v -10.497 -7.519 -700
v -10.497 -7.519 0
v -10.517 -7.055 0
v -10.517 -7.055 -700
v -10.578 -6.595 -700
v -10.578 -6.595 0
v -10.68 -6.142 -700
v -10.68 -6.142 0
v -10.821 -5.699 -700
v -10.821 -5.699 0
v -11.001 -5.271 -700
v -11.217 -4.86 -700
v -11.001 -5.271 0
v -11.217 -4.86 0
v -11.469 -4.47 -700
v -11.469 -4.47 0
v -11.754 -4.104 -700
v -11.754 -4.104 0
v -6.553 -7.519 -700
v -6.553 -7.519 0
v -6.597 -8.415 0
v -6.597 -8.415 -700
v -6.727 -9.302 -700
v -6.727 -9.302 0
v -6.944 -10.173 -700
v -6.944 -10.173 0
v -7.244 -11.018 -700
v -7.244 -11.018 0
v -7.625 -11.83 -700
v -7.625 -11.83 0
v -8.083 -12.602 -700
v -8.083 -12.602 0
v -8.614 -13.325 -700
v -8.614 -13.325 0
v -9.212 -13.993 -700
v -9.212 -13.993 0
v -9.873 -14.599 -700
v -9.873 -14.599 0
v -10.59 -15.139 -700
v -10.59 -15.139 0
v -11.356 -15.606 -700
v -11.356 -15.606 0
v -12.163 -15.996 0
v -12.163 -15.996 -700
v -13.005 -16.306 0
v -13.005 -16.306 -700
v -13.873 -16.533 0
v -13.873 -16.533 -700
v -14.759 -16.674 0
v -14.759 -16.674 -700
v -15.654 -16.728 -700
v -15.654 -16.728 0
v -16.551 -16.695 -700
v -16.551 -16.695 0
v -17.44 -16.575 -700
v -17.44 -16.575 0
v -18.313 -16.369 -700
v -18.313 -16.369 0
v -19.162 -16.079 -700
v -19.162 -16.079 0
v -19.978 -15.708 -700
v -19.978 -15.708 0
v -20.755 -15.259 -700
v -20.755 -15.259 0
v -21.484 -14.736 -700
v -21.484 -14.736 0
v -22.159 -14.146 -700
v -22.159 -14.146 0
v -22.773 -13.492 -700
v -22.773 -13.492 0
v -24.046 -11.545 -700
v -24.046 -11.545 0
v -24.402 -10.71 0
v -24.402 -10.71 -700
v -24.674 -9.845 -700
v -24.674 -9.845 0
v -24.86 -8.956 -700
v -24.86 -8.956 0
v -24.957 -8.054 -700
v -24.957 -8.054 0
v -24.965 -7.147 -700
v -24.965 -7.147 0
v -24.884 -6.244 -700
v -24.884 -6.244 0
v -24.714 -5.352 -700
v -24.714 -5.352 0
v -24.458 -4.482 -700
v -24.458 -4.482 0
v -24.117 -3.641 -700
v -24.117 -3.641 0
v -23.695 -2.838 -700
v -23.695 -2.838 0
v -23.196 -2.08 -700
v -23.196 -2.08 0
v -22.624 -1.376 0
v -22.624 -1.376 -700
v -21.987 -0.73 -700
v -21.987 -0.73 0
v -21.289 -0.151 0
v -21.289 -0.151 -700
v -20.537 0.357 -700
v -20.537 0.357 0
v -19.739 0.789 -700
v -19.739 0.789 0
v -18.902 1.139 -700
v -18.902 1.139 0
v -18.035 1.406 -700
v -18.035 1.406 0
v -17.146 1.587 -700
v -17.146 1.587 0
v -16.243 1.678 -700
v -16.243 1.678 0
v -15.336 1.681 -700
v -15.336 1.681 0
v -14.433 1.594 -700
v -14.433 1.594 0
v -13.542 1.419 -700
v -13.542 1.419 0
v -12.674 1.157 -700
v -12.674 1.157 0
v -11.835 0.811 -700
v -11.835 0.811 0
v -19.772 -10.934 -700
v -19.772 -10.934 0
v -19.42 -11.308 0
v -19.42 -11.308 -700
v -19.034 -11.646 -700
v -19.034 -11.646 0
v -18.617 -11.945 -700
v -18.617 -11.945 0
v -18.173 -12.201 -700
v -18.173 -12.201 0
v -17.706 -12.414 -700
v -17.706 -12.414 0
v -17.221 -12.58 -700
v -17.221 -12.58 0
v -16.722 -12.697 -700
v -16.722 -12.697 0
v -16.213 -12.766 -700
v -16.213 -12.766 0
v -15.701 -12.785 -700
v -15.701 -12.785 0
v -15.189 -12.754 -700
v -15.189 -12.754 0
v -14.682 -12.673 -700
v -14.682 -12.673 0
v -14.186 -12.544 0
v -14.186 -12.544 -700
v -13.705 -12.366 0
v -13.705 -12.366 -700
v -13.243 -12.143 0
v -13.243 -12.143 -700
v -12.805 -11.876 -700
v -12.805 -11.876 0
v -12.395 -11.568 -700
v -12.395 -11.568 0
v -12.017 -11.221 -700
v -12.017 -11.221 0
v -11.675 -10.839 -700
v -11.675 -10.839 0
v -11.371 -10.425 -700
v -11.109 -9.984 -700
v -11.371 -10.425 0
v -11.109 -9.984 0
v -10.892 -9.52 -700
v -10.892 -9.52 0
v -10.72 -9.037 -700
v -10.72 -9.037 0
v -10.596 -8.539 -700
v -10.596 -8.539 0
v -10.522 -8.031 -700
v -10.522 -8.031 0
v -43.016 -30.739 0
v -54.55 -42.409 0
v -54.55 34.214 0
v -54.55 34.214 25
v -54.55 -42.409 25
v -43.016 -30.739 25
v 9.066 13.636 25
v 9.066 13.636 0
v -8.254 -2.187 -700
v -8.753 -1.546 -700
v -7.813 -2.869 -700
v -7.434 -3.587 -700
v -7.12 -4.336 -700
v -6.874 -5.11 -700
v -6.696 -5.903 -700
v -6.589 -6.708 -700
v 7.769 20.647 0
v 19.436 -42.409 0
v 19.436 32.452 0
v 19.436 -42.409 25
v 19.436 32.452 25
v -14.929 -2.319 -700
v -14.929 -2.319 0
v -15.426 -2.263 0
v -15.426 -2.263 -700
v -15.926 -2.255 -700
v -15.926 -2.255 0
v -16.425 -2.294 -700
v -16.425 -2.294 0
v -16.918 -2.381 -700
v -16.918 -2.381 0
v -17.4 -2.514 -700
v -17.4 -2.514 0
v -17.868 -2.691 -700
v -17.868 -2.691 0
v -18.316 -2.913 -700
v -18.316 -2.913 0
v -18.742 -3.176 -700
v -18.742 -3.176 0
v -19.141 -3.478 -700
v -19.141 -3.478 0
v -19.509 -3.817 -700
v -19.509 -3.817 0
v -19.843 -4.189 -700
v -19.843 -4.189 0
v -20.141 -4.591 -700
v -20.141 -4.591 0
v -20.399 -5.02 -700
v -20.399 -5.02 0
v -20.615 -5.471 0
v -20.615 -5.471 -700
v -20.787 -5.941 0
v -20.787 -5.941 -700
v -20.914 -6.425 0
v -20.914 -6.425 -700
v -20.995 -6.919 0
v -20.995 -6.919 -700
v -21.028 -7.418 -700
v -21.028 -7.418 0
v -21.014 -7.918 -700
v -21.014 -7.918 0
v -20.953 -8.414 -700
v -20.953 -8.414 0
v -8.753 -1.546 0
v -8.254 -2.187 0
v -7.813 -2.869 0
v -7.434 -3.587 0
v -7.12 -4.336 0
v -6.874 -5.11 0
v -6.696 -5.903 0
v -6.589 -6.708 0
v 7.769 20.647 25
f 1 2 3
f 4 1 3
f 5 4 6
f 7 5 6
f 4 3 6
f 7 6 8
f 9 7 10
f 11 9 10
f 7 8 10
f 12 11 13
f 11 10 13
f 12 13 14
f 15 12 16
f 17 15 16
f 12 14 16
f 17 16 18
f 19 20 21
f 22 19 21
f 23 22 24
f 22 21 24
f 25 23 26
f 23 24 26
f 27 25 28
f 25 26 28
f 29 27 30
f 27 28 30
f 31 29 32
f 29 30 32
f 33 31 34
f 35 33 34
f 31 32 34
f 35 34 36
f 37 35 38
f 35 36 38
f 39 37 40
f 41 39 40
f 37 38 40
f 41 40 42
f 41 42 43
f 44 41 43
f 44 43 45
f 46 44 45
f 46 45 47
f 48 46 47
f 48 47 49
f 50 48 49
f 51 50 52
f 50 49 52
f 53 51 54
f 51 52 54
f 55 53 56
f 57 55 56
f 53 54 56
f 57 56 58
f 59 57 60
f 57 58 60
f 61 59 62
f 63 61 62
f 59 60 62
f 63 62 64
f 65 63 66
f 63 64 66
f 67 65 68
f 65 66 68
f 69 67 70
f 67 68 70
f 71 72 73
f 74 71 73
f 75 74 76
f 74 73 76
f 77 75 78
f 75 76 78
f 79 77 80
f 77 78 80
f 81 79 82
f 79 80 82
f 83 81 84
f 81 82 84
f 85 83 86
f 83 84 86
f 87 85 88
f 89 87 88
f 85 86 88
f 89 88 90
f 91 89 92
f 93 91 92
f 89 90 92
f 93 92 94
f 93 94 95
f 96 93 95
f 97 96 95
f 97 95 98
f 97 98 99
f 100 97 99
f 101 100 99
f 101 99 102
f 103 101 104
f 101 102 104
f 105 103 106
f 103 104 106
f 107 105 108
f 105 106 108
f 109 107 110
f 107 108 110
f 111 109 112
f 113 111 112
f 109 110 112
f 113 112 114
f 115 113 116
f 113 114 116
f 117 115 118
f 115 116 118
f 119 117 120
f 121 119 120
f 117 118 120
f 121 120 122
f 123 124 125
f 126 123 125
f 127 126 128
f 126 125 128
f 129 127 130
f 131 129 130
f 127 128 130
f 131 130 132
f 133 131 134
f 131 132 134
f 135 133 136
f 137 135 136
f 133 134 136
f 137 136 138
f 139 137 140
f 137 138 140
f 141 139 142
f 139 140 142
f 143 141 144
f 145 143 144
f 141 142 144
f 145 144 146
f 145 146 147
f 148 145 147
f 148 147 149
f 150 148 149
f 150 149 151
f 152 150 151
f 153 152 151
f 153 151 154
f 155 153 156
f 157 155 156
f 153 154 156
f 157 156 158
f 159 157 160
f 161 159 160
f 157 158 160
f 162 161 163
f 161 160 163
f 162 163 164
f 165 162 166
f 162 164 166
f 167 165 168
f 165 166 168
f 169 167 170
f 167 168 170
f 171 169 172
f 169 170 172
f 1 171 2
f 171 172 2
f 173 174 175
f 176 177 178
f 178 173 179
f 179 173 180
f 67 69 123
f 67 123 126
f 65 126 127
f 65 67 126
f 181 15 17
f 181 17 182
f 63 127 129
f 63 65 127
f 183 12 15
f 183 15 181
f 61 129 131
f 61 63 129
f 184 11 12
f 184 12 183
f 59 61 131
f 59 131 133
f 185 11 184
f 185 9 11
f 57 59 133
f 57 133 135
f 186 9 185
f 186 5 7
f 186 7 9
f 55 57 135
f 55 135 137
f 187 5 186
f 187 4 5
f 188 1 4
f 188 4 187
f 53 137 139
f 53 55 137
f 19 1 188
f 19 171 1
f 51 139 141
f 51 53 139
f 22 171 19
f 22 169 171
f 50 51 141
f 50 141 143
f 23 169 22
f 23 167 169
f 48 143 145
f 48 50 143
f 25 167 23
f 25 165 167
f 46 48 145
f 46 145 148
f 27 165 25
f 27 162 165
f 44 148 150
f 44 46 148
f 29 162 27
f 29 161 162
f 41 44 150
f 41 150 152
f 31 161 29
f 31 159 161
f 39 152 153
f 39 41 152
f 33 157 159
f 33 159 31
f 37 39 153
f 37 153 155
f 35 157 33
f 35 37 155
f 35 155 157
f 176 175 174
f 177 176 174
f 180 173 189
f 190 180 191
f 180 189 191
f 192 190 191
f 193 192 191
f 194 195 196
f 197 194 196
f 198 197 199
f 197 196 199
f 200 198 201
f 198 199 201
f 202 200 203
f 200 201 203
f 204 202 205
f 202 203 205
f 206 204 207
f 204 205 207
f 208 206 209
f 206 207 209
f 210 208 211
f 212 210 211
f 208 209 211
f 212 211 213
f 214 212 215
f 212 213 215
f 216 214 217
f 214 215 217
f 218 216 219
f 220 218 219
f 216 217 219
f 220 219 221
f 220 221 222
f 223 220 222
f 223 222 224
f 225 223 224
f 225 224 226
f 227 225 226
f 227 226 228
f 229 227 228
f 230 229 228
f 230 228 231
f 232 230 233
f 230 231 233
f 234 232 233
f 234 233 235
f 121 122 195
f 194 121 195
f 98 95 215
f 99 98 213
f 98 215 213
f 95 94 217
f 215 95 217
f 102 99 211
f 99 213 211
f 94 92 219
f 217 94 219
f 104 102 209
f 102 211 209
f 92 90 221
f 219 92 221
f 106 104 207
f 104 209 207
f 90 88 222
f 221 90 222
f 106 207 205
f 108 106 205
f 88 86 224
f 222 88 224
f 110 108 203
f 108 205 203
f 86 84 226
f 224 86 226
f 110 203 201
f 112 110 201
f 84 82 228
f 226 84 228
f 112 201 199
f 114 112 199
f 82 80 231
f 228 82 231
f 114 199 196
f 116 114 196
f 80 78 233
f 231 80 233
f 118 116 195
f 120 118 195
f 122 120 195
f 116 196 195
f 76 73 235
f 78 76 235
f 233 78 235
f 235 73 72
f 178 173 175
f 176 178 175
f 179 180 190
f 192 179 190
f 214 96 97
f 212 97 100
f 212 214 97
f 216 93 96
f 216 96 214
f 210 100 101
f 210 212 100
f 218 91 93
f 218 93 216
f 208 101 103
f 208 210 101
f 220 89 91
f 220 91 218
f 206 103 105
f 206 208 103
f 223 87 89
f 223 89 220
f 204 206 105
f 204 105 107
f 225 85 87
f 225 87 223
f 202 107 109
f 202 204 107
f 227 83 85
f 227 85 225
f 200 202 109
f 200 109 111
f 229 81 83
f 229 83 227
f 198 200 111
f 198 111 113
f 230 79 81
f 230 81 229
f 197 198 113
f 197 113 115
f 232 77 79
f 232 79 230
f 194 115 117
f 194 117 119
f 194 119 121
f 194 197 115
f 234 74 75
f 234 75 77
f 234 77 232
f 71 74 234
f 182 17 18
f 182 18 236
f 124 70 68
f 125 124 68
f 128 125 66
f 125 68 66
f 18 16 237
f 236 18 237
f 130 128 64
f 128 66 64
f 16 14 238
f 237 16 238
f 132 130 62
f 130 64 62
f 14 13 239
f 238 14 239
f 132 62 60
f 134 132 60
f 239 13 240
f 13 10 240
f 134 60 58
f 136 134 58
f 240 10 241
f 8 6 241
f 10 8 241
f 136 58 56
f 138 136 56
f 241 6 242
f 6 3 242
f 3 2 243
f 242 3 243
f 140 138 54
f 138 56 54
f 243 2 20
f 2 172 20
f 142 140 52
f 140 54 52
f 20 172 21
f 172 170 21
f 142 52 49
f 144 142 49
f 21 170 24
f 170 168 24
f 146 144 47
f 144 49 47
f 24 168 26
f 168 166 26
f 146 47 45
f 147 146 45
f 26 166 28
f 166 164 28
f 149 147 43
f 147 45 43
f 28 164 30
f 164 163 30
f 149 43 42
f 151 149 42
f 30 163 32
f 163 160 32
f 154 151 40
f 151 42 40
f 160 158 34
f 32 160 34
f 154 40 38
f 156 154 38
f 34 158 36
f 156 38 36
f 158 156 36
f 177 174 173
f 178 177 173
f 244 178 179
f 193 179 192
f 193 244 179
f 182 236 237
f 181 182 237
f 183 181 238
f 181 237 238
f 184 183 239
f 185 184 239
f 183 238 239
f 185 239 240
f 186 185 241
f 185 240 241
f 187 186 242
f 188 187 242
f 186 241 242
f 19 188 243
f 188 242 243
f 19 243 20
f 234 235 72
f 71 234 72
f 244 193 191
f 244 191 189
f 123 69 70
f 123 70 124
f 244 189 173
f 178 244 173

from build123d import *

# Parameters (mm, degrees)
F1_DEPTH = 25
F3_DEPTH = 700


with BuildPart() as f1:
    # F0 (on Top) → F1 (new body)
    with BuildSketch(Plane.XY):
        Polygon((7.7686894782, 20.6471044733), (-43.0160016085, -30.7388818882), (9.0659942176, 13.6355950443), align=None)
        Polygon((19.4357130677, 22.4707182497), (9.0659942176, 13.6355950443), (19.4357130677, -42.4093566835), align=None)
        Polygon((19.4357130677, 32.4522666633), (7.7686894782, 20.6471044733), (9.0659942176, 13.6355950443), (19.4357130677, 22.4707182497), align=None)
    extrude(amount=F1_DEPTH)


with BuildPart() as f1b:
    # F0 (on Top) → F1, piece 2 (new body)
    with BuildSketch(Plane.XY):
        Polygon((-43.0160016085, -30.7388818882), (-54.5499138534, 34.2137217522), (-54.5499138534, -42.4093566835), align=None)
    extrude(amount=F1_DEPTH)


with BuildPart() as f3:
    # F2 (on face) → F3 (new body)
    with BuildSketch(Plane(origin=(0, 0, 0), x_dir=(1, 0, 0), z_dir=(0, 0, -1))):
        with BuildLine():
            ThreePointArc((-8.75257057, 1.5460330711), (-7.1204420953, 4.3364534449), (-6.5530998085, 7.5189700512))
            ThreePointArc((-6.5530998085, 7.5189700512), (-12.5804459811, 16.1614905435), (-22.7733546051, 13.4919070314))
            Line((-22.7733546051, 13.4919070314), (-19.7716575849, 10.9344256395))
            ThreePointArc((-19.7716575849, 10.9344256395), (-13.9431302062, 12.4609516944), (-10.4965622555, 7.5189700512))
            ThreePointArc((-10.4965622555, 7.5189700512), (-10.8209809444, 5.6991376699), (-11.7542675901, 4.103514463))
            Line((-11.7542675901, 4.103514463), (-8.75257057, 1.5460330711))
        make_face()
    extrude(amount=F3_DEPTH)


with BuildPart() as f3b:
    # F2 (on face) → F3, piece 2 (new body)
    with BuildSketch(Plane(origin=(0, 0, 0), x_dir=(1, 0, 0), z_dir=(0, 0, -1))):
        with BuildLine():
            Line((-20.9526913799, 8.4143400974), (-24.0463962975, 11.5446747574))
            ThreePointArc((-24.0463962975, 11.5446747574), (-22.3135321176, 1.0450522853), (-11.8350327541, -0.8112724202))
            Line((-11.8350327541, -0.8112724202), (-14.9287376718, 2.3190622398))
            ThreePointArc((-14.9287376718, 2.3190622398), (-19.5087210615, 3.8170427272), (-20.9526913799, 8.4143400974))
        make_face()
    extrude(amount=F3_DEPTH)


solid = Compound([f1.part, f1b.part, f3.part, f3b.part])
